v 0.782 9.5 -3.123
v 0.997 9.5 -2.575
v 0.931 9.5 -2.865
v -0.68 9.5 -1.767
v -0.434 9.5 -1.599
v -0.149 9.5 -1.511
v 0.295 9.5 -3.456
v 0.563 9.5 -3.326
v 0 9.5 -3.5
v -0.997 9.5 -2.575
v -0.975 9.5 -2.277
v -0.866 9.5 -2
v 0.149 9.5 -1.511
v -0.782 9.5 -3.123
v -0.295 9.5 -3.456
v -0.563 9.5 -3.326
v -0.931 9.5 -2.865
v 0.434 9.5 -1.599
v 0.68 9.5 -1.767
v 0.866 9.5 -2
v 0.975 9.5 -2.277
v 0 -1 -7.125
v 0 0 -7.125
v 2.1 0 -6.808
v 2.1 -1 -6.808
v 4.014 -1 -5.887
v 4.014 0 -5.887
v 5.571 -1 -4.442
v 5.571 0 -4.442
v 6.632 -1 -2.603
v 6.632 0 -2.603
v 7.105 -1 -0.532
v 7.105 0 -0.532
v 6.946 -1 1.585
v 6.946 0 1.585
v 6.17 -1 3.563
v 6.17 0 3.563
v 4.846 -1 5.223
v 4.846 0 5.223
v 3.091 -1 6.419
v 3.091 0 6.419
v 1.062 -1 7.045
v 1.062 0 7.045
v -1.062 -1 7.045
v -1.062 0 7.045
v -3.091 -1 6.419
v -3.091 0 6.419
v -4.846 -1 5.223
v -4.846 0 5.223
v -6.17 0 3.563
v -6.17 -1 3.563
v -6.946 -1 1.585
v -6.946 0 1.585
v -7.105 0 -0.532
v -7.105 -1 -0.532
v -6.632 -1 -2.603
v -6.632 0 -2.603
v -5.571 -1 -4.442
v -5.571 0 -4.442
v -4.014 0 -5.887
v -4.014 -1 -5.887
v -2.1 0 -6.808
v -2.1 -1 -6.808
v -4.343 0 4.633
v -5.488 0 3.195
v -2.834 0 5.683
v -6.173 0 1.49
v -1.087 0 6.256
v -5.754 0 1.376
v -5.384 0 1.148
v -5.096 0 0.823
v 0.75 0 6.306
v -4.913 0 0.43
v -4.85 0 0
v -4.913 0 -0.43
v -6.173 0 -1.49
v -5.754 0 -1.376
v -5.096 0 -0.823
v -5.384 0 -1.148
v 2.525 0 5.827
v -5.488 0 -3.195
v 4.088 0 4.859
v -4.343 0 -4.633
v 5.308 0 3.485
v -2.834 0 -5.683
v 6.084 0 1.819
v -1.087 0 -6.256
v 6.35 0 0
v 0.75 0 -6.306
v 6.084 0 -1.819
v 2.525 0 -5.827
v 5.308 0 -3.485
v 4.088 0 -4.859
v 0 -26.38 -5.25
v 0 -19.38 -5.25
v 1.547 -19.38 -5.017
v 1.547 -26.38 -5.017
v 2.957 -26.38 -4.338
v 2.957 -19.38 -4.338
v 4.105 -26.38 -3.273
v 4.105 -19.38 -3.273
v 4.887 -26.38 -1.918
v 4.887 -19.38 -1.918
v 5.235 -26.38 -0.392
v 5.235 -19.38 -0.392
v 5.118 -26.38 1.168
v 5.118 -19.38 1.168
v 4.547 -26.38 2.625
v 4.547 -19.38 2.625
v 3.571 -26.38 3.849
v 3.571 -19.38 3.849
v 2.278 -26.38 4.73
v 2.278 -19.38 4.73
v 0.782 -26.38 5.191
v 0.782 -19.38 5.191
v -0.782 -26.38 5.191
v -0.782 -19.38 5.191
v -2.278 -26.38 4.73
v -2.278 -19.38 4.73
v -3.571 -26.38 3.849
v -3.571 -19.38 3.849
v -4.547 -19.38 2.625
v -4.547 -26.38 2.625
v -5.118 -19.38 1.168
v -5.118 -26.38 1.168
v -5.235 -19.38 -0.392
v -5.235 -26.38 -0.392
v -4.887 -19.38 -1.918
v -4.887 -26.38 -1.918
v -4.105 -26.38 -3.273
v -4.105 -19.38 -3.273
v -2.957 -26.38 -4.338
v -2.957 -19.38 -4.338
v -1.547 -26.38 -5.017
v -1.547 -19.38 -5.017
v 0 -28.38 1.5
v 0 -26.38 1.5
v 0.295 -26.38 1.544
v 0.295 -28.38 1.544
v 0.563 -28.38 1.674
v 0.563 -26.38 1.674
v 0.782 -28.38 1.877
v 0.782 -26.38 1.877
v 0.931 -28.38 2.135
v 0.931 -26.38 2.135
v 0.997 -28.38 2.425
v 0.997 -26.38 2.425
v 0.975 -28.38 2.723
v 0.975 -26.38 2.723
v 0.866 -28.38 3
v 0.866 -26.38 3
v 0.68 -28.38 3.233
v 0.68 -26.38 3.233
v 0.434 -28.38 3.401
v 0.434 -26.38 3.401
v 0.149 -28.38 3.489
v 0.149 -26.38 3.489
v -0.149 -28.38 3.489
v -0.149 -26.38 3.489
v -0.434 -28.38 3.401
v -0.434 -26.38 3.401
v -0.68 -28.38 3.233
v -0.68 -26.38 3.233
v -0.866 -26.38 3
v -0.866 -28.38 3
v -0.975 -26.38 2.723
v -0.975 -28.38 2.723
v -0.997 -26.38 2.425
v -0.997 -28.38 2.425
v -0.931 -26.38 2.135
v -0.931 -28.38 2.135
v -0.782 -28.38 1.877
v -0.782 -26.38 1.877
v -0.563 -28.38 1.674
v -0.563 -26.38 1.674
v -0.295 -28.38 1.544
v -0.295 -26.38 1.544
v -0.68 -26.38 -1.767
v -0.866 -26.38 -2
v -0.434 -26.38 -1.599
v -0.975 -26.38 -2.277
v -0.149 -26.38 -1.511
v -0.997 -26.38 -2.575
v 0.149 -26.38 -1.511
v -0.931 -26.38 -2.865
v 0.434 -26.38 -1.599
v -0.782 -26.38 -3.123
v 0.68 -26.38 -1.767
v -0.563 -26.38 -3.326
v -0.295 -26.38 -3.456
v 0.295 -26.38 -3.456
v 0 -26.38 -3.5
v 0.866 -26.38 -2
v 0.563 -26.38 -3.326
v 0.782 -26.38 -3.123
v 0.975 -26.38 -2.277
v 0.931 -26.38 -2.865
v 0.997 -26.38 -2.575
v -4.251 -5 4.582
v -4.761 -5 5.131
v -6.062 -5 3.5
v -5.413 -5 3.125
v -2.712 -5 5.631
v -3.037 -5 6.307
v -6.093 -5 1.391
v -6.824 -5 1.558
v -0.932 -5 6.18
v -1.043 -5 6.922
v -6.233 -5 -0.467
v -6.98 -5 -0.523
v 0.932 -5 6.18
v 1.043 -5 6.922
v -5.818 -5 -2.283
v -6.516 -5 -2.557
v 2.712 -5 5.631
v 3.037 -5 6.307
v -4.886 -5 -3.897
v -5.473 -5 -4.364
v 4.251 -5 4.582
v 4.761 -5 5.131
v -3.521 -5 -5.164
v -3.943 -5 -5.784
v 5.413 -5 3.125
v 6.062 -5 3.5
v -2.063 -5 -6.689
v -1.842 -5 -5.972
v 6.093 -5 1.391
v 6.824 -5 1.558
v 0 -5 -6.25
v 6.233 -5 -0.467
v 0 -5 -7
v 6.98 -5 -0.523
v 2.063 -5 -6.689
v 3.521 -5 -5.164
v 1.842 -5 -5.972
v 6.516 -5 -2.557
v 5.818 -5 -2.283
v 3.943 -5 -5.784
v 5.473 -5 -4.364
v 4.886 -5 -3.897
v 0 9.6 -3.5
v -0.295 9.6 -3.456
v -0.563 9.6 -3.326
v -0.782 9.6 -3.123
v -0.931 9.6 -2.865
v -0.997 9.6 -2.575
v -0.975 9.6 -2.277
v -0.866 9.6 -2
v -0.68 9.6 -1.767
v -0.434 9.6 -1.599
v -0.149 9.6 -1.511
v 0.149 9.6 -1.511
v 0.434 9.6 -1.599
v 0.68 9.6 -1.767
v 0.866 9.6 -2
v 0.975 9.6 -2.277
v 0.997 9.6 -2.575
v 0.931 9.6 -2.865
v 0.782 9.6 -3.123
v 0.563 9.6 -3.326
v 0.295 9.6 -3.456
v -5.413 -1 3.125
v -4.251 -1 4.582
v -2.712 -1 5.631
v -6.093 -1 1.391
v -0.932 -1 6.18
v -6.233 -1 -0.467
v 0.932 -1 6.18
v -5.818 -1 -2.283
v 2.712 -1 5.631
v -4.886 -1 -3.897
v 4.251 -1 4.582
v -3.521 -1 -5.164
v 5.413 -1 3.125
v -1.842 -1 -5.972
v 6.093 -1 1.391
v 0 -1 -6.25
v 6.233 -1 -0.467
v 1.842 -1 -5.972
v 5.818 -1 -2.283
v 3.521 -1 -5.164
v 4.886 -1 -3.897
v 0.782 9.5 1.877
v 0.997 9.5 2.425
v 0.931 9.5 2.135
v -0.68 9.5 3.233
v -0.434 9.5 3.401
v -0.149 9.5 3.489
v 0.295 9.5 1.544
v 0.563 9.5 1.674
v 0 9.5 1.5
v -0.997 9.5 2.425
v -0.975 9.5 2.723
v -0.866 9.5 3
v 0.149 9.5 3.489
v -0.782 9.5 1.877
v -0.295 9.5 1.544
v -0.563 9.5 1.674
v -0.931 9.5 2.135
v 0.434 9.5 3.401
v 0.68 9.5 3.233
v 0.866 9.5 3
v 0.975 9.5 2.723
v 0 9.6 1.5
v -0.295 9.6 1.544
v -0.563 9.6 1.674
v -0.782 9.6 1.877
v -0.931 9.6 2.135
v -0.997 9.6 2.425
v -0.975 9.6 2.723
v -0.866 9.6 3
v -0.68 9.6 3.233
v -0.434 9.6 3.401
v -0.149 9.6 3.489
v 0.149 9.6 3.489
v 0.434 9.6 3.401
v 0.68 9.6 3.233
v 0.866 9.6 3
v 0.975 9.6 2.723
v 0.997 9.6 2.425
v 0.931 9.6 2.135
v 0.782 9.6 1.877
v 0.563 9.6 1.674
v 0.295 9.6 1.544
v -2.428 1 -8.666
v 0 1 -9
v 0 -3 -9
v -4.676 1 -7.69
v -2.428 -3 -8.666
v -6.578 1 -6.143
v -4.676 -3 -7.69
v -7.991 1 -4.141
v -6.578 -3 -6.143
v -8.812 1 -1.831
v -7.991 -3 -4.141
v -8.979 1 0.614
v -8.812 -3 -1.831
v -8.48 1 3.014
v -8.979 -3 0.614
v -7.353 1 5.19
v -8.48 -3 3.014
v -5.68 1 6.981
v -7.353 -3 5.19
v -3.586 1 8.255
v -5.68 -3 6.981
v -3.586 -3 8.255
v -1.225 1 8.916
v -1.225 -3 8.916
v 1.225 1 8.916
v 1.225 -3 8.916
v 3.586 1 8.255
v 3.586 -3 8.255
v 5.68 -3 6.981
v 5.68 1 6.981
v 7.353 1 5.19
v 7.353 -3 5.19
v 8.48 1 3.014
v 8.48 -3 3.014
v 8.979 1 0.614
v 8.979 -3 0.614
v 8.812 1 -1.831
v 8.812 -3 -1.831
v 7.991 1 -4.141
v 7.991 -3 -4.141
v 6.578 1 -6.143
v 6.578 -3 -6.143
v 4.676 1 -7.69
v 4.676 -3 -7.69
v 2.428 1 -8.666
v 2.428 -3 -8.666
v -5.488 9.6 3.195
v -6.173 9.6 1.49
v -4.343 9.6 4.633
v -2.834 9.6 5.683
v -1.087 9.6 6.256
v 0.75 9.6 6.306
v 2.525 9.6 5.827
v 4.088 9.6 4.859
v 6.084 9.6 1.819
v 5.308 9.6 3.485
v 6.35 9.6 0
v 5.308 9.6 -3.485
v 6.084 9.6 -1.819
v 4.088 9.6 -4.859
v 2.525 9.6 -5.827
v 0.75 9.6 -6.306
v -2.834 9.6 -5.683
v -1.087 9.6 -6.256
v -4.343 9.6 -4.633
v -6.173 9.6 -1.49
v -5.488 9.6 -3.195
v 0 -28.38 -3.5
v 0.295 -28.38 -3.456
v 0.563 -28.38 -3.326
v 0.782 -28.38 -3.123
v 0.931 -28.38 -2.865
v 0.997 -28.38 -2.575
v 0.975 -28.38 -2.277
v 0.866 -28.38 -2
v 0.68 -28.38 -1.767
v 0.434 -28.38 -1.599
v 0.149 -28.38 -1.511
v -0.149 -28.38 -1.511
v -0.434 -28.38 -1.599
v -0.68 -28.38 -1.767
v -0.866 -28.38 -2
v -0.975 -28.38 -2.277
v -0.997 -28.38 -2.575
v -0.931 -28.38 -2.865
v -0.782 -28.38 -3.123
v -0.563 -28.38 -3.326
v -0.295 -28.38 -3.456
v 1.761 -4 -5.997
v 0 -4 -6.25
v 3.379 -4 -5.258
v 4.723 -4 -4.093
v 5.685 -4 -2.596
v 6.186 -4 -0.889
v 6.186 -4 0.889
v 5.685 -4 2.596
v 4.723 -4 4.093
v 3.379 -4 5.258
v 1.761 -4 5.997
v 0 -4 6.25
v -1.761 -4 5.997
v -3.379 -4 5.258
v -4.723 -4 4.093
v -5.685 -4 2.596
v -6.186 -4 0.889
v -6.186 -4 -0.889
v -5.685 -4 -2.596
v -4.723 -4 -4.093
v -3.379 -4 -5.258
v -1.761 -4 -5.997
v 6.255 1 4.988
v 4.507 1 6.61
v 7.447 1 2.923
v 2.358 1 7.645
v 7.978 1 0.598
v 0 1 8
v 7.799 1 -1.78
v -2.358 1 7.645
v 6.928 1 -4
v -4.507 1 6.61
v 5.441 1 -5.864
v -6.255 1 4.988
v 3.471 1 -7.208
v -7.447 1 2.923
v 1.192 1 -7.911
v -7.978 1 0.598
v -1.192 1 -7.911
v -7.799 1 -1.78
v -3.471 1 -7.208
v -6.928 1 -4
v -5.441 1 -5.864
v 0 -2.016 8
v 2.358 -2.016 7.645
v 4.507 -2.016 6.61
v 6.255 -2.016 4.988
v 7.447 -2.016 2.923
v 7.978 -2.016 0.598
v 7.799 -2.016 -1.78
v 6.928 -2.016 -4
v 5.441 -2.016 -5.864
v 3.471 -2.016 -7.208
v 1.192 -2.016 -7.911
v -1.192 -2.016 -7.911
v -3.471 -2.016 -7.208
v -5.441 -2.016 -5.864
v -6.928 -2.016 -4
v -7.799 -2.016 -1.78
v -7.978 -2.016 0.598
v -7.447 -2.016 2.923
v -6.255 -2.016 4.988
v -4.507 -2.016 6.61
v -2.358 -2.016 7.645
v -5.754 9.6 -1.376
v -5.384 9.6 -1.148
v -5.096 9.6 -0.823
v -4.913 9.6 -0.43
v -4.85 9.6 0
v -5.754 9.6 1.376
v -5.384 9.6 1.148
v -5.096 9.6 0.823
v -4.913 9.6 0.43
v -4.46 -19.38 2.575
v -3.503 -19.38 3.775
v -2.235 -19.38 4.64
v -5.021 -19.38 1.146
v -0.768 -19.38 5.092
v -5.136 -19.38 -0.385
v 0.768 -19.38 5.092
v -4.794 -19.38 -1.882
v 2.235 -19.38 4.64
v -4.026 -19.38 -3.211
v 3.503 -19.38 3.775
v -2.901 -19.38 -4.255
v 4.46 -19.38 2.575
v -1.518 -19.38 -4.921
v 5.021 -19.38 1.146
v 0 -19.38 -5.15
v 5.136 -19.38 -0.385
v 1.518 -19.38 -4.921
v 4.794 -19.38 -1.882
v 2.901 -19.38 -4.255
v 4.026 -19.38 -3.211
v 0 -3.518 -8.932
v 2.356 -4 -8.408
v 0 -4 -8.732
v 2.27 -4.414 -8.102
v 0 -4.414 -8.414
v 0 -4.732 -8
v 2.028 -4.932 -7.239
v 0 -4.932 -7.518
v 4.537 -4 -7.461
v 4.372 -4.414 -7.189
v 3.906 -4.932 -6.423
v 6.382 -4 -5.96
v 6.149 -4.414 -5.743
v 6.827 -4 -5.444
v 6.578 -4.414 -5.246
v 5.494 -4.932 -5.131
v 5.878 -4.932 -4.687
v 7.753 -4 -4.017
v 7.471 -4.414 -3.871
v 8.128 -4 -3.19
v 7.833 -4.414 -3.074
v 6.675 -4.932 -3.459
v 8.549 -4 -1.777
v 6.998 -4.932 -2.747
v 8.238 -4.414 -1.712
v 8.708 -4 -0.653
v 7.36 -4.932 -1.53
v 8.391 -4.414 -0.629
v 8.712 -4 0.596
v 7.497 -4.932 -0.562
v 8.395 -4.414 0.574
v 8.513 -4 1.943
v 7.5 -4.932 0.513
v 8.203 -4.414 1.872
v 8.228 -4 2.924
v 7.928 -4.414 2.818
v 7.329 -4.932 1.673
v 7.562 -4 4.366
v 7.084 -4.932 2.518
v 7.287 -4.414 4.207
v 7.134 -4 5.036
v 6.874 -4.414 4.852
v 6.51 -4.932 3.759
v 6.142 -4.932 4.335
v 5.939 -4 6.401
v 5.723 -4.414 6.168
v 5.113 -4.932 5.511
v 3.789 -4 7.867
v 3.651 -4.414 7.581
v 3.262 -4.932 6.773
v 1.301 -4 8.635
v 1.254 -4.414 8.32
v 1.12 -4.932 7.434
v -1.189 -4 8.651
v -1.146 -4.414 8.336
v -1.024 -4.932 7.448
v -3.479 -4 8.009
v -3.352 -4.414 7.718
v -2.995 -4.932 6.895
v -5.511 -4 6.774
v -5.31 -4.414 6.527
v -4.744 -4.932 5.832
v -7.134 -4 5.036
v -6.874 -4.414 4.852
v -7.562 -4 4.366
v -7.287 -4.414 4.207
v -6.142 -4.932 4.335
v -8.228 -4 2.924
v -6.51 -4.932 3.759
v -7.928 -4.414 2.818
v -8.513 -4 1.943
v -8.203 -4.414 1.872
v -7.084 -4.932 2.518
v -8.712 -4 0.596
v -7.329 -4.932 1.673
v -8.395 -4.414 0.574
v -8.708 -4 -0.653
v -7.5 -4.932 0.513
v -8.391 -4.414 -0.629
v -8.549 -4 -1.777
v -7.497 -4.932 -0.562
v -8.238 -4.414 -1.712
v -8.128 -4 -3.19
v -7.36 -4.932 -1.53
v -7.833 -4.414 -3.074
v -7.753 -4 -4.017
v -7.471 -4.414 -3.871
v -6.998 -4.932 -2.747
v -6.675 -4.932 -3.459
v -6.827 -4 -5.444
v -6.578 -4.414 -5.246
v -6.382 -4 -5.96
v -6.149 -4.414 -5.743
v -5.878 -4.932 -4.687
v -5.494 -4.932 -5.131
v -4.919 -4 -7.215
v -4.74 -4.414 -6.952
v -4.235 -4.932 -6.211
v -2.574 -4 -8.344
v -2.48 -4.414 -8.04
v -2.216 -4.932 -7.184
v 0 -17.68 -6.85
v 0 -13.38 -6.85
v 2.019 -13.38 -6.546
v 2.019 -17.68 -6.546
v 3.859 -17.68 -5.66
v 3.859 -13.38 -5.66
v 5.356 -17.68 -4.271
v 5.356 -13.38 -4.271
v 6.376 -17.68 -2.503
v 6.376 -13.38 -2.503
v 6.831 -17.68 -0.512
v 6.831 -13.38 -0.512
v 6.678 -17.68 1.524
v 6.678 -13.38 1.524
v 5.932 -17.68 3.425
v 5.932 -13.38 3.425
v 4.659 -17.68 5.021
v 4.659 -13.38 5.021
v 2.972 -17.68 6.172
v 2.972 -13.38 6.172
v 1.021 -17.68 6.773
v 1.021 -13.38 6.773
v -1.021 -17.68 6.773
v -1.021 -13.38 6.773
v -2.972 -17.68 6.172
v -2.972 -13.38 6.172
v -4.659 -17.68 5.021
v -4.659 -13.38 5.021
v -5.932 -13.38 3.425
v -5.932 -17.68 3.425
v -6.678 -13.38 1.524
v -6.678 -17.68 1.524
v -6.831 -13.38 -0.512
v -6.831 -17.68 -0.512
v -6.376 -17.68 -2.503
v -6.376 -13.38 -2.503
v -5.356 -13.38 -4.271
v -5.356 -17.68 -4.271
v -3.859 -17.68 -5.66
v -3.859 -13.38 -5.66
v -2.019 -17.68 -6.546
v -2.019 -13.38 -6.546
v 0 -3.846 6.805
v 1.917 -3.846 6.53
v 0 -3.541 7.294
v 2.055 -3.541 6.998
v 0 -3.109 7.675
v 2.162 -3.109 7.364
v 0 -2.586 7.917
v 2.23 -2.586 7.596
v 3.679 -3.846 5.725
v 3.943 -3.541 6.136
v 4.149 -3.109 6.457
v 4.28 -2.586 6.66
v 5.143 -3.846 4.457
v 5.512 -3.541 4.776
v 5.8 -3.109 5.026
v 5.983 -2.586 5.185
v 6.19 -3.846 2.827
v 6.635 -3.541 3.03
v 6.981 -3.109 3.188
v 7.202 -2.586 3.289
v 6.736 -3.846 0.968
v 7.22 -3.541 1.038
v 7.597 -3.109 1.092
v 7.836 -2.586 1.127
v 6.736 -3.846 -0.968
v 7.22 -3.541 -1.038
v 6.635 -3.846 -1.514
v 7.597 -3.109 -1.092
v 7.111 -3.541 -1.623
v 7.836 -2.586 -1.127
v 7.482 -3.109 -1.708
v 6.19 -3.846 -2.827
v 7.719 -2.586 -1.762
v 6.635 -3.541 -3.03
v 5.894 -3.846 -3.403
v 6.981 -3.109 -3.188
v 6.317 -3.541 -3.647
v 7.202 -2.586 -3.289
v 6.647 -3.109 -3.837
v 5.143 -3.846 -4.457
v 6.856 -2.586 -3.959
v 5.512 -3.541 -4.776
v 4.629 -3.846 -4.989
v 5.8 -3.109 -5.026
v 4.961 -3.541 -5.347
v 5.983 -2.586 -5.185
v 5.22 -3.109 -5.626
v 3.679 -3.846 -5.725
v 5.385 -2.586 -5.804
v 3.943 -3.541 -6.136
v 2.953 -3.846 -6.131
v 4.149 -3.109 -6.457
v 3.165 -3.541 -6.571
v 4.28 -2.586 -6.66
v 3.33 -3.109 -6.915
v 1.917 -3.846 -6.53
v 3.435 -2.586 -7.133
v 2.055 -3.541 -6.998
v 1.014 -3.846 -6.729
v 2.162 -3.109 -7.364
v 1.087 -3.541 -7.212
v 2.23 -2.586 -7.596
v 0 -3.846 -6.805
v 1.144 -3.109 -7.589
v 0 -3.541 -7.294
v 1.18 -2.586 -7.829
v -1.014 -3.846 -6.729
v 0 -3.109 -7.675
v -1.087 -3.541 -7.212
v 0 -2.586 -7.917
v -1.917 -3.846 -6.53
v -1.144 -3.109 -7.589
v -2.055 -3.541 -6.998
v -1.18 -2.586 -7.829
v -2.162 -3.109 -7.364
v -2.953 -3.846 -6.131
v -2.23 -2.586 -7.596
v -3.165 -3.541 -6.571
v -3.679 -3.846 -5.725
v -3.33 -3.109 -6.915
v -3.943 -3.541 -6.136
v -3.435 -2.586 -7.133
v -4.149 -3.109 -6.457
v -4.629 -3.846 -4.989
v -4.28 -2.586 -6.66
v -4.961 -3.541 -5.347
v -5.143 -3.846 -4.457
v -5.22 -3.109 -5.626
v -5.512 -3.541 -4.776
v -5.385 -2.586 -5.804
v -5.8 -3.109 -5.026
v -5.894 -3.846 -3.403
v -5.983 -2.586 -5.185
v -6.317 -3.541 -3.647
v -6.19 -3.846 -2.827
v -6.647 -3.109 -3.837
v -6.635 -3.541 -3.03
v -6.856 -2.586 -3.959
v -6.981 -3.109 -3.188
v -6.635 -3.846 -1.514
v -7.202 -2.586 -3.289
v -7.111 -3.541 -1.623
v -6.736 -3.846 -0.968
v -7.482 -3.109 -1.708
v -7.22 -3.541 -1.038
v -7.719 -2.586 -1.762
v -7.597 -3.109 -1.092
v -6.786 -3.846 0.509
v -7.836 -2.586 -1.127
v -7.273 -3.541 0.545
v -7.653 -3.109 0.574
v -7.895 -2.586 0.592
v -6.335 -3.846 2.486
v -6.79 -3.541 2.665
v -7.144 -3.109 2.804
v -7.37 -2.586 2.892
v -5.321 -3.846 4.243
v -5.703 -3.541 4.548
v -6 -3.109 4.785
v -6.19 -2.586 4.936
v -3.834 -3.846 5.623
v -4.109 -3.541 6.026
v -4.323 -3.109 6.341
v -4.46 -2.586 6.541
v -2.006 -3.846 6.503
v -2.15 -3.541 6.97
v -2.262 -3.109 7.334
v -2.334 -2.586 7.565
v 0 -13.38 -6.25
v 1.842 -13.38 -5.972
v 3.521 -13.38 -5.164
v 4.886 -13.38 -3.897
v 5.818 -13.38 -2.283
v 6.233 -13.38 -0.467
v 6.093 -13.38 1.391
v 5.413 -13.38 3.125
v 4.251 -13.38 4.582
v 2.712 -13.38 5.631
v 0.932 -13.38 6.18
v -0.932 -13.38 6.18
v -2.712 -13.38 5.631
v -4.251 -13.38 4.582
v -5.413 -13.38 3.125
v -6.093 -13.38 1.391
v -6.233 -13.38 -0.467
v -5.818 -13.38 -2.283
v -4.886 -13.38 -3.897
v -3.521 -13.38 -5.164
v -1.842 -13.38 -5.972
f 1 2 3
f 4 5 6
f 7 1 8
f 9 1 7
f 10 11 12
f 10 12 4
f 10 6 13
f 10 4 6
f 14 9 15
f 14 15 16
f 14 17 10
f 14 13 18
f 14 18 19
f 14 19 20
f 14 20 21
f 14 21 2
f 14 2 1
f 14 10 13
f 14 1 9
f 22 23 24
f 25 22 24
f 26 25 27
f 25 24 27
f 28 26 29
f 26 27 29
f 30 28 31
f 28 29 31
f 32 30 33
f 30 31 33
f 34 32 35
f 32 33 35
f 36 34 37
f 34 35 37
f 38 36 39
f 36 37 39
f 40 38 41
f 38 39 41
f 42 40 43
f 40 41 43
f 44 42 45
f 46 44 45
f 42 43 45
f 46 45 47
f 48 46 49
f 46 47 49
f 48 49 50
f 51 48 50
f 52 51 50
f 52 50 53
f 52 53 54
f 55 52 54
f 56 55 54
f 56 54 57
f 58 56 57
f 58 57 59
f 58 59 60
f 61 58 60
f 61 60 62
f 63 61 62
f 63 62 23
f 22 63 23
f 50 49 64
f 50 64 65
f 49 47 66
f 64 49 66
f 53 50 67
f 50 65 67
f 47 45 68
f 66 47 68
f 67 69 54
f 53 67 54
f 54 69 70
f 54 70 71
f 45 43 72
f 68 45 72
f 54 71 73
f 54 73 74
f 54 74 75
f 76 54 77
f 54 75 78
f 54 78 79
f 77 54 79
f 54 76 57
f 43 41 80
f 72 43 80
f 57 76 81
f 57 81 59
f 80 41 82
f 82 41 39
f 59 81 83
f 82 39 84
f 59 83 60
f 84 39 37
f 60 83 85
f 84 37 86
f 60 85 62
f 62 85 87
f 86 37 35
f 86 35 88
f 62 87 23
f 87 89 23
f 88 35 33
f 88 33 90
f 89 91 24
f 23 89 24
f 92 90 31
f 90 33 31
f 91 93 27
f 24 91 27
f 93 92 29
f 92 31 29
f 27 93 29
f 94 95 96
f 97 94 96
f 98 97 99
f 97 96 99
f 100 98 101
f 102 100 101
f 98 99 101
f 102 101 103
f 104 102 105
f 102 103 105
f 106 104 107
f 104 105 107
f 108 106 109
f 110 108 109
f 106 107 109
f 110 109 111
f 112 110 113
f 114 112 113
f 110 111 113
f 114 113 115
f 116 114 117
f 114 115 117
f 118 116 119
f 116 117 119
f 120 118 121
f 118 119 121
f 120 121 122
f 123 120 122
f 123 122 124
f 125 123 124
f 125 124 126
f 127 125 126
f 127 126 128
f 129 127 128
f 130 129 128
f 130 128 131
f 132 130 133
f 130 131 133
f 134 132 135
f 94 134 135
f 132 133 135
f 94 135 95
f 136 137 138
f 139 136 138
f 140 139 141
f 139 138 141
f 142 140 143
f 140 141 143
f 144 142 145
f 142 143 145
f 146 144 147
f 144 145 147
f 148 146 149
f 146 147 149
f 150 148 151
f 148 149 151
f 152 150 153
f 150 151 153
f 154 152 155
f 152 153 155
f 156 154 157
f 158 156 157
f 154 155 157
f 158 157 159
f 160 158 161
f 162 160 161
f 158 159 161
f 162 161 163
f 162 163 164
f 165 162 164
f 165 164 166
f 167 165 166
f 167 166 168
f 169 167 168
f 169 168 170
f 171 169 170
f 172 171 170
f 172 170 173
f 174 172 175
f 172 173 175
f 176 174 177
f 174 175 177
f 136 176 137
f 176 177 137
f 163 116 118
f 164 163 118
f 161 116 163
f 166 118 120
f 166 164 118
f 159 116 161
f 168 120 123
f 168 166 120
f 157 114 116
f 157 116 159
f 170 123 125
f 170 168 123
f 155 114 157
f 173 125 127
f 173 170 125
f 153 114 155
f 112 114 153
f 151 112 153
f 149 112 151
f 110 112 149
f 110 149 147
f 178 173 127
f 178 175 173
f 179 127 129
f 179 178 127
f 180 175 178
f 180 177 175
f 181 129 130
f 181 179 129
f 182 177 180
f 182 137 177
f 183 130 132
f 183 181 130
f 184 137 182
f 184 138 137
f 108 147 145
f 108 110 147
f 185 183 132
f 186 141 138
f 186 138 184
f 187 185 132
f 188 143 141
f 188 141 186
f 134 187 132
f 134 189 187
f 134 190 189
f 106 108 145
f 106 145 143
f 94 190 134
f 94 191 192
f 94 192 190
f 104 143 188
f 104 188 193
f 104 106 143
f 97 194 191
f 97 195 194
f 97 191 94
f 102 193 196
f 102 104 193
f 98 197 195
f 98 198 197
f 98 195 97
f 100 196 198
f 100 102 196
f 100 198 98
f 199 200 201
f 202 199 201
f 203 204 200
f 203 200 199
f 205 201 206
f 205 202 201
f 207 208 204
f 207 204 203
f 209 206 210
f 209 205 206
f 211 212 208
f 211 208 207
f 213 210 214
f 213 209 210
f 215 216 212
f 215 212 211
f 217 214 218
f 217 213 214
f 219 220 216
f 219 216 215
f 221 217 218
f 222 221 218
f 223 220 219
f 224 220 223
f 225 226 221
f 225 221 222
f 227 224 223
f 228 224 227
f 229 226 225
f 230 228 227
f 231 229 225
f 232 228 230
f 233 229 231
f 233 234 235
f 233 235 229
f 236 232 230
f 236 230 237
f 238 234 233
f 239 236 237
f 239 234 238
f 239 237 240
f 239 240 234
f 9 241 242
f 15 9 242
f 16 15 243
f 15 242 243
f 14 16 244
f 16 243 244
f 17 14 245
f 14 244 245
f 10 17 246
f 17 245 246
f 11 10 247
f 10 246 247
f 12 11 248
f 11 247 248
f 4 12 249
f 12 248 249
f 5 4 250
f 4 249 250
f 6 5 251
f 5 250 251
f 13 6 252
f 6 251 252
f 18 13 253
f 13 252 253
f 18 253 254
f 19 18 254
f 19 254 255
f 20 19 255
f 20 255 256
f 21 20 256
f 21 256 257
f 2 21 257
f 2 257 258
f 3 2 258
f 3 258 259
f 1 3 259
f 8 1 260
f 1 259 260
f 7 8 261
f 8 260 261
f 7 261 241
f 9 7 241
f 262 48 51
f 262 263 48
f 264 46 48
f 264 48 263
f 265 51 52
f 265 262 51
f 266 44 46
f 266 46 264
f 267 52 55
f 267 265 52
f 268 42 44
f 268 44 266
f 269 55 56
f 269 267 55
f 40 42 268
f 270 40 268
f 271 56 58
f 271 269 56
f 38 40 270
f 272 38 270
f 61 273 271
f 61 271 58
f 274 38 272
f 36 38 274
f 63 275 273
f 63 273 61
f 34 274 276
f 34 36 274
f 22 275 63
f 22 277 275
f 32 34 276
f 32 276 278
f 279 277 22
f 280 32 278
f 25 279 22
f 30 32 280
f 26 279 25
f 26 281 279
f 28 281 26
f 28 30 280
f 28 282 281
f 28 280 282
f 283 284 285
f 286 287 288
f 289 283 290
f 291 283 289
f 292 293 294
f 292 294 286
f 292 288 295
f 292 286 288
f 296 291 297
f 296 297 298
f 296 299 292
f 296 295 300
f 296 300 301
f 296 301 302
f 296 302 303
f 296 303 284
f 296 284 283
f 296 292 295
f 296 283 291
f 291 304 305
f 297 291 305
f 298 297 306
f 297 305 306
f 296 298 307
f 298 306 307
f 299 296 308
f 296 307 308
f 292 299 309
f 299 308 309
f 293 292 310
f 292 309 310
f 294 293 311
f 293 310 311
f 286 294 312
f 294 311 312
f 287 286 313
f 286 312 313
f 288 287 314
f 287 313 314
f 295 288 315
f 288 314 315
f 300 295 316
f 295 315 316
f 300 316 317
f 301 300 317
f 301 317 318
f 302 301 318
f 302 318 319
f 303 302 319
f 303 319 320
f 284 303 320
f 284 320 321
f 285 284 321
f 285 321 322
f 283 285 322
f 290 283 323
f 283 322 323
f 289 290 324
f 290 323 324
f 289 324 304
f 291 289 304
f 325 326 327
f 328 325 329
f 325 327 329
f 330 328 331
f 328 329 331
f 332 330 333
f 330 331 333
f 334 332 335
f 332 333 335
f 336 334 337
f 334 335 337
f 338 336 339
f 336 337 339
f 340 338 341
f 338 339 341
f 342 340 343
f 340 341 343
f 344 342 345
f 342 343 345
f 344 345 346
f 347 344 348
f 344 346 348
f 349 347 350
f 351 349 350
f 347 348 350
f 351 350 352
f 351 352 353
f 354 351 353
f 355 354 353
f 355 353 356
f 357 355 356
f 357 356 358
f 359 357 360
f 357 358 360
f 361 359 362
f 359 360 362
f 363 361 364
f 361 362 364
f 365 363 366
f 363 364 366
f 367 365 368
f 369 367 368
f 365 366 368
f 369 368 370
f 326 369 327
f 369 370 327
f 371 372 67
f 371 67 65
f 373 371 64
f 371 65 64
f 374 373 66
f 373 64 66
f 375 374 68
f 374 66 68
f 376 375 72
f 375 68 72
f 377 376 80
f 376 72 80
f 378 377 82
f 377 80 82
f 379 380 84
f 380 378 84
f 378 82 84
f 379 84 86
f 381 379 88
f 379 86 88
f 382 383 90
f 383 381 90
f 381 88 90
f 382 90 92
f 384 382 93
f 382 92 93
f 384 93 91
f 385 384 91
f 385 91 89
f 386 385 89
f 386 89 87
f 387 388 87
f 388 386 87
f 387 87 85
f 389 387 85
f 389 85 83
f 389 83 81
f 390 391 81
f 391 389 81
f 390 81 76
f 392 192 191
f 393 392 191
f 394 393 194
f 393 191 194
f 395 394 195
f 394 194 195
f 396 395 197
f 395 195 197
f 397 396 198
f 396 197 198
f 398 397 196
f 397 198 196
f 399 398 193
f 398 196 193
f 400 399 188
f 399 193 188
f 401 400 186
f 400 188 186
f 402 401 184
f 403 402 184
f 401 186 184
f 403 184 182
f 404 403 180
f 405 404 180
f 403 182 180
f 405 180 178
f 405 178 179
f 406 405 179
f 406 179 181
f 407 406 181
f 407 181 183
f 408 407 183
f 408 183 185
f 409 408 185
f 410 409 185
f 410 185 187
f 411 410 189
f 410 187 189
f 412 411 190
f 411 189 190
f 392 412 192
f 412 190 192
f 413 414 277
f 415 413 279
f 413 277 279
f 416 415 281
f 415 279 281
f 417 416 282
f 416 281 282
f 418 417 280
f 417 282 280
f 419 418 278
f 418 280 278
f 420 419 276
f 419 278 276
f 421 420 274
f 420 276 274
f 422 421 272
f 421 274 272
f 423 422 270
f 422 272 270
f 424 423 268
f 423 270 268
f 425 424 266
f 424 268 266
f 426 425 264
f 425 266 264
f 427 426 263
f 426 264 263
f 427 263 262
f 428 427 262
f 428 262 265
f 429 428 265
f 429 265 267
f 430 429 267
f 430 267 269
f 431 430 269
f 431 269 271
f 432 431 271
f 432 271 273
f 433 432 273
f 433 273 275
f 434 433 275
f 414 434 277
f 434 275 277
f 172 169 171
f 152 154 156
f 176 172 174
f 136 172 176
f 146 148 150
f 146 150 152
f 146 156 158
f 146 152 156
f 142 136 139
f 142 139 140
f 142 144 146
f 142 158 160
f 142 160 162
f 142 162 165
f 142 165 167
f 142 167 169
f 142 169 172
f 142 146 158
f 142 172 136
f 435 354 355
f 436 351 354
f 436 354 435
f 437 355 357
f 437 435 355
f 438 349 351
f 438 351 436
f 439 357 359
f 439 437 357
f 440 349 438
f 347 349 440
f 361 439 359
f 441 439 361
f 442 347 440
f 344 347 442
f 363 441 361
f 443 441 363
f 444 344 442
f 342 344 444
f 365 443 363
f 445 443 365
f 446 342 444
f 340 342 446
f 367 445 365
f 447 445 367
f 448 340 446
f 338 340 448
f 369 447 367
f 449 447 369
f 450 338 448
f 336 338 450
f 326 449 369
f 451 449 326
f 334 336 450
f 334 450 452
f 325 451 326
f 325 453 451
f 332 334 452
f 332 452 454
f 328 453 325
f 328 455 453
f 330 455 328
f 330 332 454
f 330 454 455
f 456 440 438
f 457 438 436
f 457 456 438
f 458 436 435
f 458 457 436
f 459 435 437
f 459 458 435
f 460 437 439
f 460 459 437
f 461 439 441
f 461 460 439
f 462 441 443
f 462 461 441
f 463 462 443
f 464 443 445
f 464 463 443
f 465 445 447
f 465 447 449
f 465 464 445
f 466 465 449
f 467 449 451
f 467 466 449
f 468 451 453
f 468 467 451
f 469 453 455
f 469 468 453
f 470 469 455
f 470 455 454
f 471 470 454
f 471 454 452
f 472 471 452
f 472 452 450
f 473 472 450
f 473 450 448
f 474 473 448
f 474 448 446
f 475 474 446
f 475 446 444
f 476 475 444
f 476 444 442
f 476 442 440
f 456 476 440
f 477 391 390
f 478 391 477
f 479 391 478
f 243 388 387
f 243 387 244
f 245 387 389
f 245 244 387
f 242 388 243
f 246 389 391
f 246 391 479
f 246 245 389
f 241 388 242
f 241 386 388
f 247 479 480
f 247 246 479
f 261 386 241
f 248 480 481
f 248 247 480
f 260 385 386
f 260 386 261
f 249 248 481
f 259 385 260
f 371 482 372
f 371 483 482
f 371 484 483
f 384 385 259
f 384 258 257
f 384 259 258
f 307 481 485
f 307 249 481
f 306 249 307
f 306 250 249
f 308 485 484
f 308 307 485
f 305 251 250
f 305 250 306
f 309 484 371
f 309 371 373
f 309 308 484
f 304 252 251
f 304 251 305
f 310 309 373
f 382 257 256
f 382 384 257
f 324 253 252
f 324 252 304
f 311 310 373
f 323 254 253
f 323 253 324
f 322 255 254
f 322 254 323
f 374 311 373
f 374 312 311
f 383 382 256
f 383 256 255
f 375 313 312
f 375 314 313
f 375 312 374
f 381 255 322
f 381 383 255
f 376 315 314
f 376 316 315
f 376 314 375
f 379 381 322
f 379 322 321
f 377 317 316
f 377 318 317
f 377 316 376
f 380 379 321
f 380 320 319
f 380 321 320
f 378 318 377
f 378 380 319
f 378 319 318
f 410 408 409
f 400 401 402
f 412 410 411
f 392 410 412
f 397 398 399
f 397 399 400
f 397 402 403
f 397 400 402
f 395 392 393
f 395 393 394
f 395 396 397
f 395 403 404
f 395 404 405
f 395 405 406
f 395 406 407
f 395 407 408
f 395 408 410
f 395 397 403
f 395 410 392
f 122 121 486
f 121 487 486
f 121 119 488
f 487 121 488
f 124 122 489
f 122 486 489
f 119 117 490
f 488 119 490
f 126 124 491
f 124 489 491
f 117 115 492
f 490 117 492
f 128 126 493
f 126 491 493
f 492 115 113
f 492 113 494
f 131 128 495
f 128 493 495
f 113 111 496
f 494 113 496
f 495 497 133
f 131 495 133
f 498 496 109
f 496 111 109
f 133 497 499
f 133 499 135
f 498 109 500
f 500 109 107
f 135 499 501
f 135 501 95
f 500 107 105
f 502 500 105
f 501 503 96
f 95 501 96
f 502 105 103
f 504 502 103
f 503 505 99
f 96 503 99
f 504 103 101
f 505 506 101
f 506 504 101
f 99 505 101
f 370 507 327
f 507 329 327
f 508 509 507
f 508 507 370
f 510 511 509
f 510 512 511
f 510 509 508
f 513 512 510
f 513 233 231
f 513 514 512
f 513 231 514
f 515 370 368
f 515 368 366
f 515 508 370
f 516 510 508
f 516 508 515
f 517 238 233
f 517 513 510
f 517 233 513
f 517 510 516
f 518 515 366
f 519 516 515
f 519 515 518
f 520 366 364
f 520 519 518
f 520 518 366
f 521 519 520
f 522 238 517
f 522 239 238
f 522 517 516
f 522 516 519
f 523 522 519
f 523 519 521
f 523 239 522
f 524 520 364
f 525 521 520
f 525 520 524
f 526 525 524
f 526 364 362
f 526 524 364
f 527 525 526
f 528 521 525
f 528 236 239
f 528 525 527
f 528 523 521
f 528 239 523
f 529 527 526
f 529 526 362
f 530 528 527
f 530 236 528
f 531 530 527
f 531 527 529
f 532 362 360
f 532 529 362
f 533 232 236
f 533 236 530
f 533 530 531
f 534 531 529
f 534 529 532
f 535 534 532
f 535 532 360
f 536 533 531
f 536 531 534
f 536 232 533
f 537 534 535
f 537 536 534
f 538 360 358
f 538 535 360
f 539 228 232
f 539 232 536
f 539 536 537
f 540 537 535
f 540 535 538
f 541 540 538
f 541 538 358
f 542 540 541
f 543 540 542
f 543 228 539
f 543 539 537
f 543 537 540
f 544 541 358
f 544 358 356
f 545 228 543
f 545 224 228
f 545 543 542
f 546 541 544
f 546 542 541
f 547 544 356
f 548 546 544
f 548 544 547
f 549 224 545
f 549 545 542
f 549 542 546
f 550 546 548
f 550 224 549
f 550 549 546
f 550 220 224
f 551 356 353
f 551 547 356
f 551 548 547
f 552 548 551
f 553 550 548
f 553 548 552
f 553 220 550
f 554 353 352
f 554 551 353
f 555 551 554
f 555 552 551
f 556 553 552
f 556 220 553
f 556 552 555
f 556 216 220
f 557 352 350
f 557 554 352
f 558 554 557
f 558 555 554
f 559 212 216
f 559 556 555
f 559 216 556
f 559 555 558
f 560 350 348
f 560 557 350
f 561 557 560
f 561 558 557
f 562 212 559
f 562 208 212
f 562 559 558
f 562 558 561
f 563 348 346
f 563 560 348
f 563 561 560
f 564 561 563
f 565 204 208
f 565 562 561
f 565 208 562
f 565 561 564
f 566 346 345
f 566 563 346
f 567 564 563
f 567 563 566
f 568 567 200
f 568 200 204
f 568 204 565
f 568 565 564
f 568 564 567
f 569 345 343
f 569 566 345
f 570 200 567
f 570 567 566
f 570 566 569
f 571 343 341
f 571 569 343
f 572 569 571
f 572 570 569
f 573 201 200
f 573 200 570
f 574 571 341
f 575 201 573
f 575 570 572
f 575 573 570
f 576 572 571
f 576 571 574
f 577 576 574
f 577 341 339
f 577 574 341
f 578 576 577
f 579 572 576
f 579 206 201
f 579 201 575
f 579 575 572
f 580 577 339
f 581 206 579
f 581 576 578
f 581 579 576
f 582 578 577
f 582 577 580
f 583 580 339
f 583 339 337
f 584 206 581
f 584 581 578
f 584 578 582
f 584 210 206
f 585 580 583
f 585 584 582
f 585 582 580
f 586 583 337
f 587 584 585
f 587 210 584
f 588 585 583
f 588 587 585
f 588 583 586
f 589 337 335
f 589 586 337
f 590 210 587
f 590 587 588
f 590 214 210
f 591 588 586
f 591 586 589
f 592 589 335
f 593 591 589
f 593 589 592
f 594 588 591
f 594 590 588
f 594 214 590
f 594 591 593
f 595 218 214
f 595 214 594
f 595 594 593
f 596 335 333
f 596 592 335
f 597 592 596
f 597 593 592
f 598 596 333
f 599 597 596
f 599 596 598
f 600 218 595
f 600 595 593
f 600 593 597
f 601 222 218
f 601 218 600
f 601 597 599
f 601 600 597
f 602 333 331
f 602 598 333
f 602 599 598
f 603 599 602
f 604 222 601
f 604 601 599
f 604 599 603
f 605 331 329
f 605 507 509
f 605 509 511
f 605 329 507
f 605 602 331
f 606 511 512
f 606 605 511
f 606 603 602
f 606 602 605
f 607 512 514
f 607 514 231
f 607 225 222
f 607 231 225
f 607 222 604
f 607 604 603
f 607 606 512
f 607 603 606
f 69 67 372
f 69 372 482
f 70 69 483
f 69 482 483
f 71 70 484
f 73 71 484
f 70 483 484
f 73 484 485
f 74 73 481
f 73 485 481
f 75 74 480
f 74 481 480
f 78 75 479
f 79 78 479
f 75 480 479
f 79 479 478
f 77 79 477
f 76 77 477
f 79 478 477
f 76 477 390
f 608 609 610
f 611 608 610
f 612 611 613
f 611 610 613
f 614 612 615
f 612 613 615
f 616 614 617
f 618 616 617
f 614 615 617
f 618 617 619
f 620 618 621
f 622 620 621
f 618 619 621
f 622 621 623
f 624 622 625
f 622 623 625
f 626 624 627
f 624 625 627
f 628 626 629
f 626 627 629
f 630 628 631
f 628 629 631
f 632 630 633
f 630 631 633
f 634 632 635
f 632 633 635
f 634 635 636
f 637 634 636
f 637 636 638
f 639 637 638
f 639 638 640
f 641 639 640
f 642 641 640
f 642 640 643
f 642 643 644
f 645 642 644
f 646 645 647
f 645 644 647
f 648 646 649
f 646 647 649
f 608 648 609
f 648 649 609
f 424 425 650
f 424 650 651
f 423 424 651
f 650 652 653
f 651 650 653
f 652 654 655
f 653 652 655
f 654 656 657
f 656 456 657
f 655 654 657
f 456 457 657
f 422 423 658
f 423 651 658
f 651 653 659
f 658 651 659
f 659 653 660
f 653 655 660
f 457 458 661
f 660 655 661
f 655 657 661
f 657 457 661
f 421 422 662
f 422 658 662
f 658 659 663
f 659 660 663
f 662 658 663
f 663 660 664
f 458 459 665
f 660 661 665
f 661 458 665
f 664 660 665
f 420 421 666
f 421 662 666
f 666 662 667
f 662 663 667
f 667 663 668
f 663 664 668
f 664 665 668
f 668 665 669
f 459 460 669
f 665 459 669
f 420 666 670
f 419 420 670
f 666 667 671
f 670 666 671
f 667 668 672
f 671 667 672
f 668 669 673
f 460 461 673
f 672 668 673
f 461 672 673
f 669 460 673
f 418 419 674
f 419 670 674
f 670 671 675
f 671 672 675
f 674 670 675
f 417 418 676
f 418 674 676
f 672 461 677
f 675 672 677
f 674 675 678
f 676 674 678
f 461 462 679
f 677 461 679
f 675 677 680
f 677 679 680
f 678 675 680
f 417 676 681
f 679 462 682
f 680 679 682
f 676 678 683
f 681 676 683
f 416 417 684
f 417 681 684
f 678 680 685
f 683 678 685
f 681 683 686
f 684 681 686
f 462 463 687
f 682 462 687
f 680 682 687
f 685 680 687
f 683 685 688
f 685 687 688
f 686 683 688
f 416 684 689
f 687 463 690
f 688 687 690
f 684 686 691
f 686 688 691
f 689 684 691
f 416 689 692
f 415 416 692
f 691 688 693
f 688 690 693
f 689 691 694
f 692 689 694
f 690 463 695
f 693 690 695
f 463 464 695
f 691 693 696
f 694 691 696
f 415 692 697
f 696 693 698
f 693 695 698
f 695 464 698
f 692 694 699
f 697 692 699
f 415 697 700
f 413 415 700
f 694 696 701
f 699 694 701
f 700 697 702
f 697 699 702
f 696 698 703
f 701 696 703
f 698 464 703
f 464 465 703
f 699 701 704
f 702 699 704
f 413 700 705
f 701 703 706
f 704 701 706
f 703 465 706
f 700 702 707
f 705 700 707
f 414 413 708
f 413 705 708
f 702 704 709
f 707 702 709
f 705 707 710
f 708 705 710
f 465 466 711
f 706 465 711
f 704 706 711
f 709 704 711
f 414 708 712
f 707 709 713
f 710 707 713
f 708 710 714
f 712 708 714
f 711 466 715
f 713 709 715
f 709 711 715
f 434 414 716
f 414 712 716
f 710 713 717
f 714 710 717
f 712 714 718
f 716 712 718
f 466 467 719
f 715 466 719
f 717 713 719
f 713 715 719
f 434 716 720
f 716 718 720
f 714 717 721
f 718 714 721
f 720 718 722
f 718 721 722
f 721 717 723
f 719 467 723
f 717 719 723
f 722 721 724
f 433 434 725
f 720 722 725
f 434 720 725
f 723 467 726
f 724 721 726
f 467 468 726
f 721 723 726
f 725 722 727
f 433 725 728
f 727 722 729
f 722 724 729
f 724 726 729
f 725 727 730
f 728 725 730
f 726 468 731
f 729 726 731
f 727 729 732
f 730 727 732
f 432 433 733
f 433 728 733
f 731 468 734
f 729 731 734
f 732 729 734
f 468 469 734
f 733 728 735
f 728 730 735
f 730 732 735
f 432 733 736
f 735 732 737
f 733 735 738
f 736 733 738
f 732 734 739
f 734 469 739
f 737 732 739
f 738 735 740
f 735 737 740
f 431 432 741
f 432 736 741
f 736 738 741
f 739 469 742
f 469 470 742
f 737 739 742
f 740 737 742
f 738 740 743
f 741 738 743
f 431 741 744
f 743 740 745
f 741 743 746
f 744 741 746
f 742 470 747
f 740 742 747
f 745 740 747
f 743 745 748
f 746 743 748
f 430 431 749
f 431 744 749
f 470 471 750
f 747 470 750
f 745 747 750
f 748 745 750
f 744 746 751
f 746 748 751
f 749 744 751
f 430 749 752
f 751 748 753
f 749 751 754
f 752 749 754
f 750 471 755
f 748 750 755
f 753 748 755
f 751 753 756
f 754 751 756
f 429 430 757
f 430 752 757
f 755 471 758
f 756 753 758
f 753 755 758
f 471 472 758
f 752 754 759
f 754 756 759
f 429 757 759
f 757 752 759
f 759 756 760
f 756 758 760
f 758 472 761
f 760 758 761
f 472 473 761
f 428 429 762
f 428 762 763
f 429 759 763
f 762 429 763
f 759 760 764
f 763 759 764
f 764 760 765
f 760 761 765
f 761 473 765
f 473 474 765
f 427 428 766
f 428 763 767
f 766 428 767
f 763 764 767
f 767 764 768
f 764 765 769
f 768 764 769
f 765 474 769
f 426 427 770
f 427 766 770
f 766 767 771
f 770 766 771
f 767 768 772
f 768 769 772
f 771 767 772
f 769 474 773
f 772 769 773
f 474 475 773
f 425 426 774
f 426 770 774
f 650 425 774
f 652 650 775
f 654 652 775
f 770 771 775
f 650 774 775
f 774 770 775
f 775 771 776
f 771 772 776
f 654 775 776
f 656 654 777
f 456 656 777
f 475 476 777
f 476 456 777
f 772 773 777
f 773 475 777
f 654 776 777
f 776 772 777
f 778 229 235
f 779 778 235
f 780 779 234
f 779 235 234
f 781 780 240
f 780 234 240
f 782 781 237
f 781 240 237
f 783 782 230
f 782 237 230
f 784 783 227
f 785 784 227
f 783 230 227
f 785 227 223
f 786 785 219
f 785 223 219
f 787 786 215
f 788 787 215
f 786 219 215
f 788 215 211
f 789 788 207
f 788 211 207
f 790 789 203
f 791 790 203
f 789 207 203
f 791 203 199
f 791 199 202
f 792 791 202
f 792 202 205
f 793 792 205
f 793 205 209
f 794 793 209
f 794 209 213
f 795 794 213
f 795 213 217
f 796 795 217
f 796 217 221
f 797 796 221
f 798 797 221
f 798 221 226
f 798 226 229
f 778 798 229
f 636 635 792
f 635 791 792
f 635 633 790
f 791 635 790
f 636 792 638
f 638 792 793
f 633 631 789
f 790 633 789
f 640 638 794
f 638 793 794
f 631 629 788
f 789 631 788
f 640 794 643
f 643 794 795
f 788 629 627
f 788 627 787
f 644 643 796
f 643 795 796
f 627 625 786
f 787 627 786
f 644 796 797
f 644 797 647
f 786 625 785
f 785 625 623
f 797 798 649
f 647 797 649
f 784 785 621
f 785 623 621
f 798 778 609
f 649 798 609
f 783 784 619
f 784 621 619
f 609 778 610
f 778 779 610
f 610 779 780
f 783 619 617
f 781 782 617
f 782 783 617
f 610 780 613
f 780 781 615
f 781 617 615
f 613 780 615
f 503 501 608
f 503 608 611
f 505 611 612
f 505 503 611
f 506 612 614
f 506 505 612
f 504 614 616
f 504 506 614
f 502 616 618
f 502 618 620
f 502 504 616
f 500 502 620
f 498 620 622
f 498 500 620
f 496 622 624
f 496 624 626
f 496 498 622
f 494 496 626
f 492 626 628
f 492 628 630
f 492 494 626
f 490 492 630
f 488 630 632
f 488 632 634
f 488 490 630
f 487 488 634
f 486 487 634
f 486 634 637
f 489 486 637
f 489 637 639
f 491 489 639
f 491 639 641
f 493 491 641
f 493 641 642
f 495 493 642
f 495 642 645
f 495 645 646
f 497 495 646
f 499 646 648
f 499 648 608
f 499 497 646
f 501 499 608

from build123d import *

# Parameters (mm, degrees)
SKETCH_1_R          = 6.35
EXTRUDE_1_DEPTH     = 9.6
SKETCH_2_R          = 7.125
EXTRUDE_2_DEPTH     = 1
SKETCH_3_R          = 6.25
EXTRUDE_3_DEPTH     = 12.38
SKETCH_4_R          = 6.85
EXTRUDE_4_DEPTH     = 6
CHAMFER_1_SIZE      = 1.7
SKETCH_5_R          = 5.25
EXTRUDE_5_DEPTH     = 7
SKETCH_6_R          = 9
EXTRUDE_6_DEPTH     = 1
SKETCH_7_R          = 9
SKETCH_7_R_2        = 8
EXTRUDE_7_DEPTH     = 5
FILLET_1_R          = 2
SKETCH_8_R          = 1
EXTRUDE_8_DEPTH     = 2
SKETCH_9_R          = 1.5
CUT_EXTRUDE_1_DEPTH = 9.6
SKETCH_10_R         = 1
CUT_EXTRUDE_2_DEPTH = 0.1


with BuildPart() as part:
    # 草图1 → 凸台-拉伸1 (new body)
    with BuildSketch(Plane(origin=(0, 0, 0), x_dir=(1, 0, 0), z_dir=(0, 1, 0))):
        with Locations(Location((0, 0, 0), (0, 0, 270))):
            Circle(SKETCH_1_R)
    extrude(amount=EXTRUDE_1_DEPTH)

    # 草图2 → 凸台-拉伸2 (add)
    with BuildSketch(Plane(origin=(0, 0, 0), x_dir=(-1, 0, 0), z_dir=(0, -1, 0))):
        with Locations(Location((0, 0, 0), (0, 0, 90))):
            Circle(SKETCH_2_R)
    extrude(amount=EXTRUDE_2_DEPTH)

    # 草图3 → 凸台-拉伸3 (add)
    with BuildSketch(Plane.XZ.offset(1)):
        with Locations(Location((0, 0, 0), (0, 0, 270))):
            Circle(SKETCH_3_R)
    extrude(amount=EXTRUDE_3_DEPTH)

    # 草图4 → 凸台-拉伸4 (add)
    with BuildSketch(Plane.XZ.offset(13.38)):
        with Locations(Location((0, 0, 0), (0, 0, 270))):
            Circle(SKETCH_4_R)
    extrude(amount=EXTRUDE_4_DEPTH)

    # 倒角1
    chamfer_1_edges = [part.edges().sort_by_distance(p)[0] for p in [
        (0, -19.38, 6.85),
    ]]
    chamfer(chamfer_1_edges, length=CHAMFER_1_SIZE)

    # 草图5 → 凸台-拉伸5 (add)
    with BuildSketch(Plane.XZ.offset(19.38)):
        with Locations(Location((0, 0, 0), (0, 0, 270))):
            Circle(SKETCH_5_R)
    extrude(amount=EXTRUDE_5_DEPTH)

    # 草图6 → 凸台-拉伸6 (add)
    with BuildSketch(Plane(origin=(0, -5, 0), x_dir=(-1, 0, 0), z_dir=(0, -1, 0))):
        with Locations(Location((0, 0, 0), (0, 0, 90))):
            Circle(SKETCH_6_R)
    extrude(amount=-EXTRUDE_6_DEPTH)

    # 草图7 → 凸台-拉伸7 (add)
    with BuildSketch(Plane(origin=(0, -4, 0), x_dir=(1, 0, 0), z_dir=(0, 1, 0))):
        with Locations(Location((0, 0, 0), (0, 0, 90))):
            Circle(SKETCH_7_R)
        with Locations(Location((0, 0, 0), (0, 0, 270))):
            Circle(SKETCH_7_R_2, mode=Mode.SUBTRACT)
    extrude(amount=EXTRUDE_7_DEPTH)

    # 圆角1
    # the kernel refuses this fillet: 2 mm, written as the material it adds along each edge
    with BuildSketch(Plane(origin=(0, -4, 0), x_dir=(0, 0, 1), z_dir=(-1, 0, 0))) as fillet_1_piece_1:
        with BuildLine():
            CenterArc((6, 1.984313483), FILLET_1_R, 277.180755781, 82.819244219)
            Line((6.25, 0), (8, 0))
            Line((8, 0), (8, 1.984313483))
        make_face()
    revolve(axis=Axis((0, -4, 0), (0, 1, 0)))
    # the kernel refuses this fillet: 2 mm, written as the material it takes off along each edge
    with BuildSketch(Plane(origin=(0, -5, 0), x_dir=(0, 0, -1), z_dir=(-1, 0, 0))) as fillet_1_2_piece_1:
        with BuildLine():
            CenterArc((9 - FILLET_1_R, -FILLET_1_R), FILLET_1_R, 0, 90)
            Line((9, -FILLET_1_R), (9, 0))
            Line((9, 0), (9 - FILLET_1_R, 0))
        make_face()
    revolve(axis=Axis((0, -5, 0), (0, -1, 0)), mode=Mode.SUBTRACT)

    # 草图8 → 凸台-拉伸8 (add)
    with BuildSketch(Plane.XZ.offset(26.38)):
        with Locations(Location((0, -2.5, 0), (0, 0, 270))):
            Circle(SKETCH_8_R)
        with Locations(Location((0, 2.5, 0), (0, 0, 270))):
            Circle(SKETCH_8_R)
    extrude(amount=EXTRUDE_8_DEPTH)

    # 草图9 → 切除-拉伸1 (cut)
    with BuildSketch(Plane(origin=(0, 9.6, 0), x_dir=(1, 0, 0), z_dir=(0, 1, 0))):
        with Locations((-6.35, 0)):
            Circle(SKETCH_9_R)
    extrude(amount=-CUT_EXTRUDE_1_DEPTH, mode=Mode.SUBTRACT)

    # 草图10 → 切除-拉伸2 (cut)
    with BuildSketch(Plane(origin=(0, 9.6, 0), x_dir=(1, 0, 0), z_dir=(0, 1, 0))):
        with Locations(Location((0, -2.5, 0), (0, 0, 90))):
            Circle(SKETCH_10_R)
        with Locations(Location((0, 2.5, 0), (0, 0, 90))):
            Circle(SKETCH_10_R)
    extrude(amount=-CUT_EXTRUDE_2_DEPTH, mode=Mode.SUBTRACT)


solid = part.part
